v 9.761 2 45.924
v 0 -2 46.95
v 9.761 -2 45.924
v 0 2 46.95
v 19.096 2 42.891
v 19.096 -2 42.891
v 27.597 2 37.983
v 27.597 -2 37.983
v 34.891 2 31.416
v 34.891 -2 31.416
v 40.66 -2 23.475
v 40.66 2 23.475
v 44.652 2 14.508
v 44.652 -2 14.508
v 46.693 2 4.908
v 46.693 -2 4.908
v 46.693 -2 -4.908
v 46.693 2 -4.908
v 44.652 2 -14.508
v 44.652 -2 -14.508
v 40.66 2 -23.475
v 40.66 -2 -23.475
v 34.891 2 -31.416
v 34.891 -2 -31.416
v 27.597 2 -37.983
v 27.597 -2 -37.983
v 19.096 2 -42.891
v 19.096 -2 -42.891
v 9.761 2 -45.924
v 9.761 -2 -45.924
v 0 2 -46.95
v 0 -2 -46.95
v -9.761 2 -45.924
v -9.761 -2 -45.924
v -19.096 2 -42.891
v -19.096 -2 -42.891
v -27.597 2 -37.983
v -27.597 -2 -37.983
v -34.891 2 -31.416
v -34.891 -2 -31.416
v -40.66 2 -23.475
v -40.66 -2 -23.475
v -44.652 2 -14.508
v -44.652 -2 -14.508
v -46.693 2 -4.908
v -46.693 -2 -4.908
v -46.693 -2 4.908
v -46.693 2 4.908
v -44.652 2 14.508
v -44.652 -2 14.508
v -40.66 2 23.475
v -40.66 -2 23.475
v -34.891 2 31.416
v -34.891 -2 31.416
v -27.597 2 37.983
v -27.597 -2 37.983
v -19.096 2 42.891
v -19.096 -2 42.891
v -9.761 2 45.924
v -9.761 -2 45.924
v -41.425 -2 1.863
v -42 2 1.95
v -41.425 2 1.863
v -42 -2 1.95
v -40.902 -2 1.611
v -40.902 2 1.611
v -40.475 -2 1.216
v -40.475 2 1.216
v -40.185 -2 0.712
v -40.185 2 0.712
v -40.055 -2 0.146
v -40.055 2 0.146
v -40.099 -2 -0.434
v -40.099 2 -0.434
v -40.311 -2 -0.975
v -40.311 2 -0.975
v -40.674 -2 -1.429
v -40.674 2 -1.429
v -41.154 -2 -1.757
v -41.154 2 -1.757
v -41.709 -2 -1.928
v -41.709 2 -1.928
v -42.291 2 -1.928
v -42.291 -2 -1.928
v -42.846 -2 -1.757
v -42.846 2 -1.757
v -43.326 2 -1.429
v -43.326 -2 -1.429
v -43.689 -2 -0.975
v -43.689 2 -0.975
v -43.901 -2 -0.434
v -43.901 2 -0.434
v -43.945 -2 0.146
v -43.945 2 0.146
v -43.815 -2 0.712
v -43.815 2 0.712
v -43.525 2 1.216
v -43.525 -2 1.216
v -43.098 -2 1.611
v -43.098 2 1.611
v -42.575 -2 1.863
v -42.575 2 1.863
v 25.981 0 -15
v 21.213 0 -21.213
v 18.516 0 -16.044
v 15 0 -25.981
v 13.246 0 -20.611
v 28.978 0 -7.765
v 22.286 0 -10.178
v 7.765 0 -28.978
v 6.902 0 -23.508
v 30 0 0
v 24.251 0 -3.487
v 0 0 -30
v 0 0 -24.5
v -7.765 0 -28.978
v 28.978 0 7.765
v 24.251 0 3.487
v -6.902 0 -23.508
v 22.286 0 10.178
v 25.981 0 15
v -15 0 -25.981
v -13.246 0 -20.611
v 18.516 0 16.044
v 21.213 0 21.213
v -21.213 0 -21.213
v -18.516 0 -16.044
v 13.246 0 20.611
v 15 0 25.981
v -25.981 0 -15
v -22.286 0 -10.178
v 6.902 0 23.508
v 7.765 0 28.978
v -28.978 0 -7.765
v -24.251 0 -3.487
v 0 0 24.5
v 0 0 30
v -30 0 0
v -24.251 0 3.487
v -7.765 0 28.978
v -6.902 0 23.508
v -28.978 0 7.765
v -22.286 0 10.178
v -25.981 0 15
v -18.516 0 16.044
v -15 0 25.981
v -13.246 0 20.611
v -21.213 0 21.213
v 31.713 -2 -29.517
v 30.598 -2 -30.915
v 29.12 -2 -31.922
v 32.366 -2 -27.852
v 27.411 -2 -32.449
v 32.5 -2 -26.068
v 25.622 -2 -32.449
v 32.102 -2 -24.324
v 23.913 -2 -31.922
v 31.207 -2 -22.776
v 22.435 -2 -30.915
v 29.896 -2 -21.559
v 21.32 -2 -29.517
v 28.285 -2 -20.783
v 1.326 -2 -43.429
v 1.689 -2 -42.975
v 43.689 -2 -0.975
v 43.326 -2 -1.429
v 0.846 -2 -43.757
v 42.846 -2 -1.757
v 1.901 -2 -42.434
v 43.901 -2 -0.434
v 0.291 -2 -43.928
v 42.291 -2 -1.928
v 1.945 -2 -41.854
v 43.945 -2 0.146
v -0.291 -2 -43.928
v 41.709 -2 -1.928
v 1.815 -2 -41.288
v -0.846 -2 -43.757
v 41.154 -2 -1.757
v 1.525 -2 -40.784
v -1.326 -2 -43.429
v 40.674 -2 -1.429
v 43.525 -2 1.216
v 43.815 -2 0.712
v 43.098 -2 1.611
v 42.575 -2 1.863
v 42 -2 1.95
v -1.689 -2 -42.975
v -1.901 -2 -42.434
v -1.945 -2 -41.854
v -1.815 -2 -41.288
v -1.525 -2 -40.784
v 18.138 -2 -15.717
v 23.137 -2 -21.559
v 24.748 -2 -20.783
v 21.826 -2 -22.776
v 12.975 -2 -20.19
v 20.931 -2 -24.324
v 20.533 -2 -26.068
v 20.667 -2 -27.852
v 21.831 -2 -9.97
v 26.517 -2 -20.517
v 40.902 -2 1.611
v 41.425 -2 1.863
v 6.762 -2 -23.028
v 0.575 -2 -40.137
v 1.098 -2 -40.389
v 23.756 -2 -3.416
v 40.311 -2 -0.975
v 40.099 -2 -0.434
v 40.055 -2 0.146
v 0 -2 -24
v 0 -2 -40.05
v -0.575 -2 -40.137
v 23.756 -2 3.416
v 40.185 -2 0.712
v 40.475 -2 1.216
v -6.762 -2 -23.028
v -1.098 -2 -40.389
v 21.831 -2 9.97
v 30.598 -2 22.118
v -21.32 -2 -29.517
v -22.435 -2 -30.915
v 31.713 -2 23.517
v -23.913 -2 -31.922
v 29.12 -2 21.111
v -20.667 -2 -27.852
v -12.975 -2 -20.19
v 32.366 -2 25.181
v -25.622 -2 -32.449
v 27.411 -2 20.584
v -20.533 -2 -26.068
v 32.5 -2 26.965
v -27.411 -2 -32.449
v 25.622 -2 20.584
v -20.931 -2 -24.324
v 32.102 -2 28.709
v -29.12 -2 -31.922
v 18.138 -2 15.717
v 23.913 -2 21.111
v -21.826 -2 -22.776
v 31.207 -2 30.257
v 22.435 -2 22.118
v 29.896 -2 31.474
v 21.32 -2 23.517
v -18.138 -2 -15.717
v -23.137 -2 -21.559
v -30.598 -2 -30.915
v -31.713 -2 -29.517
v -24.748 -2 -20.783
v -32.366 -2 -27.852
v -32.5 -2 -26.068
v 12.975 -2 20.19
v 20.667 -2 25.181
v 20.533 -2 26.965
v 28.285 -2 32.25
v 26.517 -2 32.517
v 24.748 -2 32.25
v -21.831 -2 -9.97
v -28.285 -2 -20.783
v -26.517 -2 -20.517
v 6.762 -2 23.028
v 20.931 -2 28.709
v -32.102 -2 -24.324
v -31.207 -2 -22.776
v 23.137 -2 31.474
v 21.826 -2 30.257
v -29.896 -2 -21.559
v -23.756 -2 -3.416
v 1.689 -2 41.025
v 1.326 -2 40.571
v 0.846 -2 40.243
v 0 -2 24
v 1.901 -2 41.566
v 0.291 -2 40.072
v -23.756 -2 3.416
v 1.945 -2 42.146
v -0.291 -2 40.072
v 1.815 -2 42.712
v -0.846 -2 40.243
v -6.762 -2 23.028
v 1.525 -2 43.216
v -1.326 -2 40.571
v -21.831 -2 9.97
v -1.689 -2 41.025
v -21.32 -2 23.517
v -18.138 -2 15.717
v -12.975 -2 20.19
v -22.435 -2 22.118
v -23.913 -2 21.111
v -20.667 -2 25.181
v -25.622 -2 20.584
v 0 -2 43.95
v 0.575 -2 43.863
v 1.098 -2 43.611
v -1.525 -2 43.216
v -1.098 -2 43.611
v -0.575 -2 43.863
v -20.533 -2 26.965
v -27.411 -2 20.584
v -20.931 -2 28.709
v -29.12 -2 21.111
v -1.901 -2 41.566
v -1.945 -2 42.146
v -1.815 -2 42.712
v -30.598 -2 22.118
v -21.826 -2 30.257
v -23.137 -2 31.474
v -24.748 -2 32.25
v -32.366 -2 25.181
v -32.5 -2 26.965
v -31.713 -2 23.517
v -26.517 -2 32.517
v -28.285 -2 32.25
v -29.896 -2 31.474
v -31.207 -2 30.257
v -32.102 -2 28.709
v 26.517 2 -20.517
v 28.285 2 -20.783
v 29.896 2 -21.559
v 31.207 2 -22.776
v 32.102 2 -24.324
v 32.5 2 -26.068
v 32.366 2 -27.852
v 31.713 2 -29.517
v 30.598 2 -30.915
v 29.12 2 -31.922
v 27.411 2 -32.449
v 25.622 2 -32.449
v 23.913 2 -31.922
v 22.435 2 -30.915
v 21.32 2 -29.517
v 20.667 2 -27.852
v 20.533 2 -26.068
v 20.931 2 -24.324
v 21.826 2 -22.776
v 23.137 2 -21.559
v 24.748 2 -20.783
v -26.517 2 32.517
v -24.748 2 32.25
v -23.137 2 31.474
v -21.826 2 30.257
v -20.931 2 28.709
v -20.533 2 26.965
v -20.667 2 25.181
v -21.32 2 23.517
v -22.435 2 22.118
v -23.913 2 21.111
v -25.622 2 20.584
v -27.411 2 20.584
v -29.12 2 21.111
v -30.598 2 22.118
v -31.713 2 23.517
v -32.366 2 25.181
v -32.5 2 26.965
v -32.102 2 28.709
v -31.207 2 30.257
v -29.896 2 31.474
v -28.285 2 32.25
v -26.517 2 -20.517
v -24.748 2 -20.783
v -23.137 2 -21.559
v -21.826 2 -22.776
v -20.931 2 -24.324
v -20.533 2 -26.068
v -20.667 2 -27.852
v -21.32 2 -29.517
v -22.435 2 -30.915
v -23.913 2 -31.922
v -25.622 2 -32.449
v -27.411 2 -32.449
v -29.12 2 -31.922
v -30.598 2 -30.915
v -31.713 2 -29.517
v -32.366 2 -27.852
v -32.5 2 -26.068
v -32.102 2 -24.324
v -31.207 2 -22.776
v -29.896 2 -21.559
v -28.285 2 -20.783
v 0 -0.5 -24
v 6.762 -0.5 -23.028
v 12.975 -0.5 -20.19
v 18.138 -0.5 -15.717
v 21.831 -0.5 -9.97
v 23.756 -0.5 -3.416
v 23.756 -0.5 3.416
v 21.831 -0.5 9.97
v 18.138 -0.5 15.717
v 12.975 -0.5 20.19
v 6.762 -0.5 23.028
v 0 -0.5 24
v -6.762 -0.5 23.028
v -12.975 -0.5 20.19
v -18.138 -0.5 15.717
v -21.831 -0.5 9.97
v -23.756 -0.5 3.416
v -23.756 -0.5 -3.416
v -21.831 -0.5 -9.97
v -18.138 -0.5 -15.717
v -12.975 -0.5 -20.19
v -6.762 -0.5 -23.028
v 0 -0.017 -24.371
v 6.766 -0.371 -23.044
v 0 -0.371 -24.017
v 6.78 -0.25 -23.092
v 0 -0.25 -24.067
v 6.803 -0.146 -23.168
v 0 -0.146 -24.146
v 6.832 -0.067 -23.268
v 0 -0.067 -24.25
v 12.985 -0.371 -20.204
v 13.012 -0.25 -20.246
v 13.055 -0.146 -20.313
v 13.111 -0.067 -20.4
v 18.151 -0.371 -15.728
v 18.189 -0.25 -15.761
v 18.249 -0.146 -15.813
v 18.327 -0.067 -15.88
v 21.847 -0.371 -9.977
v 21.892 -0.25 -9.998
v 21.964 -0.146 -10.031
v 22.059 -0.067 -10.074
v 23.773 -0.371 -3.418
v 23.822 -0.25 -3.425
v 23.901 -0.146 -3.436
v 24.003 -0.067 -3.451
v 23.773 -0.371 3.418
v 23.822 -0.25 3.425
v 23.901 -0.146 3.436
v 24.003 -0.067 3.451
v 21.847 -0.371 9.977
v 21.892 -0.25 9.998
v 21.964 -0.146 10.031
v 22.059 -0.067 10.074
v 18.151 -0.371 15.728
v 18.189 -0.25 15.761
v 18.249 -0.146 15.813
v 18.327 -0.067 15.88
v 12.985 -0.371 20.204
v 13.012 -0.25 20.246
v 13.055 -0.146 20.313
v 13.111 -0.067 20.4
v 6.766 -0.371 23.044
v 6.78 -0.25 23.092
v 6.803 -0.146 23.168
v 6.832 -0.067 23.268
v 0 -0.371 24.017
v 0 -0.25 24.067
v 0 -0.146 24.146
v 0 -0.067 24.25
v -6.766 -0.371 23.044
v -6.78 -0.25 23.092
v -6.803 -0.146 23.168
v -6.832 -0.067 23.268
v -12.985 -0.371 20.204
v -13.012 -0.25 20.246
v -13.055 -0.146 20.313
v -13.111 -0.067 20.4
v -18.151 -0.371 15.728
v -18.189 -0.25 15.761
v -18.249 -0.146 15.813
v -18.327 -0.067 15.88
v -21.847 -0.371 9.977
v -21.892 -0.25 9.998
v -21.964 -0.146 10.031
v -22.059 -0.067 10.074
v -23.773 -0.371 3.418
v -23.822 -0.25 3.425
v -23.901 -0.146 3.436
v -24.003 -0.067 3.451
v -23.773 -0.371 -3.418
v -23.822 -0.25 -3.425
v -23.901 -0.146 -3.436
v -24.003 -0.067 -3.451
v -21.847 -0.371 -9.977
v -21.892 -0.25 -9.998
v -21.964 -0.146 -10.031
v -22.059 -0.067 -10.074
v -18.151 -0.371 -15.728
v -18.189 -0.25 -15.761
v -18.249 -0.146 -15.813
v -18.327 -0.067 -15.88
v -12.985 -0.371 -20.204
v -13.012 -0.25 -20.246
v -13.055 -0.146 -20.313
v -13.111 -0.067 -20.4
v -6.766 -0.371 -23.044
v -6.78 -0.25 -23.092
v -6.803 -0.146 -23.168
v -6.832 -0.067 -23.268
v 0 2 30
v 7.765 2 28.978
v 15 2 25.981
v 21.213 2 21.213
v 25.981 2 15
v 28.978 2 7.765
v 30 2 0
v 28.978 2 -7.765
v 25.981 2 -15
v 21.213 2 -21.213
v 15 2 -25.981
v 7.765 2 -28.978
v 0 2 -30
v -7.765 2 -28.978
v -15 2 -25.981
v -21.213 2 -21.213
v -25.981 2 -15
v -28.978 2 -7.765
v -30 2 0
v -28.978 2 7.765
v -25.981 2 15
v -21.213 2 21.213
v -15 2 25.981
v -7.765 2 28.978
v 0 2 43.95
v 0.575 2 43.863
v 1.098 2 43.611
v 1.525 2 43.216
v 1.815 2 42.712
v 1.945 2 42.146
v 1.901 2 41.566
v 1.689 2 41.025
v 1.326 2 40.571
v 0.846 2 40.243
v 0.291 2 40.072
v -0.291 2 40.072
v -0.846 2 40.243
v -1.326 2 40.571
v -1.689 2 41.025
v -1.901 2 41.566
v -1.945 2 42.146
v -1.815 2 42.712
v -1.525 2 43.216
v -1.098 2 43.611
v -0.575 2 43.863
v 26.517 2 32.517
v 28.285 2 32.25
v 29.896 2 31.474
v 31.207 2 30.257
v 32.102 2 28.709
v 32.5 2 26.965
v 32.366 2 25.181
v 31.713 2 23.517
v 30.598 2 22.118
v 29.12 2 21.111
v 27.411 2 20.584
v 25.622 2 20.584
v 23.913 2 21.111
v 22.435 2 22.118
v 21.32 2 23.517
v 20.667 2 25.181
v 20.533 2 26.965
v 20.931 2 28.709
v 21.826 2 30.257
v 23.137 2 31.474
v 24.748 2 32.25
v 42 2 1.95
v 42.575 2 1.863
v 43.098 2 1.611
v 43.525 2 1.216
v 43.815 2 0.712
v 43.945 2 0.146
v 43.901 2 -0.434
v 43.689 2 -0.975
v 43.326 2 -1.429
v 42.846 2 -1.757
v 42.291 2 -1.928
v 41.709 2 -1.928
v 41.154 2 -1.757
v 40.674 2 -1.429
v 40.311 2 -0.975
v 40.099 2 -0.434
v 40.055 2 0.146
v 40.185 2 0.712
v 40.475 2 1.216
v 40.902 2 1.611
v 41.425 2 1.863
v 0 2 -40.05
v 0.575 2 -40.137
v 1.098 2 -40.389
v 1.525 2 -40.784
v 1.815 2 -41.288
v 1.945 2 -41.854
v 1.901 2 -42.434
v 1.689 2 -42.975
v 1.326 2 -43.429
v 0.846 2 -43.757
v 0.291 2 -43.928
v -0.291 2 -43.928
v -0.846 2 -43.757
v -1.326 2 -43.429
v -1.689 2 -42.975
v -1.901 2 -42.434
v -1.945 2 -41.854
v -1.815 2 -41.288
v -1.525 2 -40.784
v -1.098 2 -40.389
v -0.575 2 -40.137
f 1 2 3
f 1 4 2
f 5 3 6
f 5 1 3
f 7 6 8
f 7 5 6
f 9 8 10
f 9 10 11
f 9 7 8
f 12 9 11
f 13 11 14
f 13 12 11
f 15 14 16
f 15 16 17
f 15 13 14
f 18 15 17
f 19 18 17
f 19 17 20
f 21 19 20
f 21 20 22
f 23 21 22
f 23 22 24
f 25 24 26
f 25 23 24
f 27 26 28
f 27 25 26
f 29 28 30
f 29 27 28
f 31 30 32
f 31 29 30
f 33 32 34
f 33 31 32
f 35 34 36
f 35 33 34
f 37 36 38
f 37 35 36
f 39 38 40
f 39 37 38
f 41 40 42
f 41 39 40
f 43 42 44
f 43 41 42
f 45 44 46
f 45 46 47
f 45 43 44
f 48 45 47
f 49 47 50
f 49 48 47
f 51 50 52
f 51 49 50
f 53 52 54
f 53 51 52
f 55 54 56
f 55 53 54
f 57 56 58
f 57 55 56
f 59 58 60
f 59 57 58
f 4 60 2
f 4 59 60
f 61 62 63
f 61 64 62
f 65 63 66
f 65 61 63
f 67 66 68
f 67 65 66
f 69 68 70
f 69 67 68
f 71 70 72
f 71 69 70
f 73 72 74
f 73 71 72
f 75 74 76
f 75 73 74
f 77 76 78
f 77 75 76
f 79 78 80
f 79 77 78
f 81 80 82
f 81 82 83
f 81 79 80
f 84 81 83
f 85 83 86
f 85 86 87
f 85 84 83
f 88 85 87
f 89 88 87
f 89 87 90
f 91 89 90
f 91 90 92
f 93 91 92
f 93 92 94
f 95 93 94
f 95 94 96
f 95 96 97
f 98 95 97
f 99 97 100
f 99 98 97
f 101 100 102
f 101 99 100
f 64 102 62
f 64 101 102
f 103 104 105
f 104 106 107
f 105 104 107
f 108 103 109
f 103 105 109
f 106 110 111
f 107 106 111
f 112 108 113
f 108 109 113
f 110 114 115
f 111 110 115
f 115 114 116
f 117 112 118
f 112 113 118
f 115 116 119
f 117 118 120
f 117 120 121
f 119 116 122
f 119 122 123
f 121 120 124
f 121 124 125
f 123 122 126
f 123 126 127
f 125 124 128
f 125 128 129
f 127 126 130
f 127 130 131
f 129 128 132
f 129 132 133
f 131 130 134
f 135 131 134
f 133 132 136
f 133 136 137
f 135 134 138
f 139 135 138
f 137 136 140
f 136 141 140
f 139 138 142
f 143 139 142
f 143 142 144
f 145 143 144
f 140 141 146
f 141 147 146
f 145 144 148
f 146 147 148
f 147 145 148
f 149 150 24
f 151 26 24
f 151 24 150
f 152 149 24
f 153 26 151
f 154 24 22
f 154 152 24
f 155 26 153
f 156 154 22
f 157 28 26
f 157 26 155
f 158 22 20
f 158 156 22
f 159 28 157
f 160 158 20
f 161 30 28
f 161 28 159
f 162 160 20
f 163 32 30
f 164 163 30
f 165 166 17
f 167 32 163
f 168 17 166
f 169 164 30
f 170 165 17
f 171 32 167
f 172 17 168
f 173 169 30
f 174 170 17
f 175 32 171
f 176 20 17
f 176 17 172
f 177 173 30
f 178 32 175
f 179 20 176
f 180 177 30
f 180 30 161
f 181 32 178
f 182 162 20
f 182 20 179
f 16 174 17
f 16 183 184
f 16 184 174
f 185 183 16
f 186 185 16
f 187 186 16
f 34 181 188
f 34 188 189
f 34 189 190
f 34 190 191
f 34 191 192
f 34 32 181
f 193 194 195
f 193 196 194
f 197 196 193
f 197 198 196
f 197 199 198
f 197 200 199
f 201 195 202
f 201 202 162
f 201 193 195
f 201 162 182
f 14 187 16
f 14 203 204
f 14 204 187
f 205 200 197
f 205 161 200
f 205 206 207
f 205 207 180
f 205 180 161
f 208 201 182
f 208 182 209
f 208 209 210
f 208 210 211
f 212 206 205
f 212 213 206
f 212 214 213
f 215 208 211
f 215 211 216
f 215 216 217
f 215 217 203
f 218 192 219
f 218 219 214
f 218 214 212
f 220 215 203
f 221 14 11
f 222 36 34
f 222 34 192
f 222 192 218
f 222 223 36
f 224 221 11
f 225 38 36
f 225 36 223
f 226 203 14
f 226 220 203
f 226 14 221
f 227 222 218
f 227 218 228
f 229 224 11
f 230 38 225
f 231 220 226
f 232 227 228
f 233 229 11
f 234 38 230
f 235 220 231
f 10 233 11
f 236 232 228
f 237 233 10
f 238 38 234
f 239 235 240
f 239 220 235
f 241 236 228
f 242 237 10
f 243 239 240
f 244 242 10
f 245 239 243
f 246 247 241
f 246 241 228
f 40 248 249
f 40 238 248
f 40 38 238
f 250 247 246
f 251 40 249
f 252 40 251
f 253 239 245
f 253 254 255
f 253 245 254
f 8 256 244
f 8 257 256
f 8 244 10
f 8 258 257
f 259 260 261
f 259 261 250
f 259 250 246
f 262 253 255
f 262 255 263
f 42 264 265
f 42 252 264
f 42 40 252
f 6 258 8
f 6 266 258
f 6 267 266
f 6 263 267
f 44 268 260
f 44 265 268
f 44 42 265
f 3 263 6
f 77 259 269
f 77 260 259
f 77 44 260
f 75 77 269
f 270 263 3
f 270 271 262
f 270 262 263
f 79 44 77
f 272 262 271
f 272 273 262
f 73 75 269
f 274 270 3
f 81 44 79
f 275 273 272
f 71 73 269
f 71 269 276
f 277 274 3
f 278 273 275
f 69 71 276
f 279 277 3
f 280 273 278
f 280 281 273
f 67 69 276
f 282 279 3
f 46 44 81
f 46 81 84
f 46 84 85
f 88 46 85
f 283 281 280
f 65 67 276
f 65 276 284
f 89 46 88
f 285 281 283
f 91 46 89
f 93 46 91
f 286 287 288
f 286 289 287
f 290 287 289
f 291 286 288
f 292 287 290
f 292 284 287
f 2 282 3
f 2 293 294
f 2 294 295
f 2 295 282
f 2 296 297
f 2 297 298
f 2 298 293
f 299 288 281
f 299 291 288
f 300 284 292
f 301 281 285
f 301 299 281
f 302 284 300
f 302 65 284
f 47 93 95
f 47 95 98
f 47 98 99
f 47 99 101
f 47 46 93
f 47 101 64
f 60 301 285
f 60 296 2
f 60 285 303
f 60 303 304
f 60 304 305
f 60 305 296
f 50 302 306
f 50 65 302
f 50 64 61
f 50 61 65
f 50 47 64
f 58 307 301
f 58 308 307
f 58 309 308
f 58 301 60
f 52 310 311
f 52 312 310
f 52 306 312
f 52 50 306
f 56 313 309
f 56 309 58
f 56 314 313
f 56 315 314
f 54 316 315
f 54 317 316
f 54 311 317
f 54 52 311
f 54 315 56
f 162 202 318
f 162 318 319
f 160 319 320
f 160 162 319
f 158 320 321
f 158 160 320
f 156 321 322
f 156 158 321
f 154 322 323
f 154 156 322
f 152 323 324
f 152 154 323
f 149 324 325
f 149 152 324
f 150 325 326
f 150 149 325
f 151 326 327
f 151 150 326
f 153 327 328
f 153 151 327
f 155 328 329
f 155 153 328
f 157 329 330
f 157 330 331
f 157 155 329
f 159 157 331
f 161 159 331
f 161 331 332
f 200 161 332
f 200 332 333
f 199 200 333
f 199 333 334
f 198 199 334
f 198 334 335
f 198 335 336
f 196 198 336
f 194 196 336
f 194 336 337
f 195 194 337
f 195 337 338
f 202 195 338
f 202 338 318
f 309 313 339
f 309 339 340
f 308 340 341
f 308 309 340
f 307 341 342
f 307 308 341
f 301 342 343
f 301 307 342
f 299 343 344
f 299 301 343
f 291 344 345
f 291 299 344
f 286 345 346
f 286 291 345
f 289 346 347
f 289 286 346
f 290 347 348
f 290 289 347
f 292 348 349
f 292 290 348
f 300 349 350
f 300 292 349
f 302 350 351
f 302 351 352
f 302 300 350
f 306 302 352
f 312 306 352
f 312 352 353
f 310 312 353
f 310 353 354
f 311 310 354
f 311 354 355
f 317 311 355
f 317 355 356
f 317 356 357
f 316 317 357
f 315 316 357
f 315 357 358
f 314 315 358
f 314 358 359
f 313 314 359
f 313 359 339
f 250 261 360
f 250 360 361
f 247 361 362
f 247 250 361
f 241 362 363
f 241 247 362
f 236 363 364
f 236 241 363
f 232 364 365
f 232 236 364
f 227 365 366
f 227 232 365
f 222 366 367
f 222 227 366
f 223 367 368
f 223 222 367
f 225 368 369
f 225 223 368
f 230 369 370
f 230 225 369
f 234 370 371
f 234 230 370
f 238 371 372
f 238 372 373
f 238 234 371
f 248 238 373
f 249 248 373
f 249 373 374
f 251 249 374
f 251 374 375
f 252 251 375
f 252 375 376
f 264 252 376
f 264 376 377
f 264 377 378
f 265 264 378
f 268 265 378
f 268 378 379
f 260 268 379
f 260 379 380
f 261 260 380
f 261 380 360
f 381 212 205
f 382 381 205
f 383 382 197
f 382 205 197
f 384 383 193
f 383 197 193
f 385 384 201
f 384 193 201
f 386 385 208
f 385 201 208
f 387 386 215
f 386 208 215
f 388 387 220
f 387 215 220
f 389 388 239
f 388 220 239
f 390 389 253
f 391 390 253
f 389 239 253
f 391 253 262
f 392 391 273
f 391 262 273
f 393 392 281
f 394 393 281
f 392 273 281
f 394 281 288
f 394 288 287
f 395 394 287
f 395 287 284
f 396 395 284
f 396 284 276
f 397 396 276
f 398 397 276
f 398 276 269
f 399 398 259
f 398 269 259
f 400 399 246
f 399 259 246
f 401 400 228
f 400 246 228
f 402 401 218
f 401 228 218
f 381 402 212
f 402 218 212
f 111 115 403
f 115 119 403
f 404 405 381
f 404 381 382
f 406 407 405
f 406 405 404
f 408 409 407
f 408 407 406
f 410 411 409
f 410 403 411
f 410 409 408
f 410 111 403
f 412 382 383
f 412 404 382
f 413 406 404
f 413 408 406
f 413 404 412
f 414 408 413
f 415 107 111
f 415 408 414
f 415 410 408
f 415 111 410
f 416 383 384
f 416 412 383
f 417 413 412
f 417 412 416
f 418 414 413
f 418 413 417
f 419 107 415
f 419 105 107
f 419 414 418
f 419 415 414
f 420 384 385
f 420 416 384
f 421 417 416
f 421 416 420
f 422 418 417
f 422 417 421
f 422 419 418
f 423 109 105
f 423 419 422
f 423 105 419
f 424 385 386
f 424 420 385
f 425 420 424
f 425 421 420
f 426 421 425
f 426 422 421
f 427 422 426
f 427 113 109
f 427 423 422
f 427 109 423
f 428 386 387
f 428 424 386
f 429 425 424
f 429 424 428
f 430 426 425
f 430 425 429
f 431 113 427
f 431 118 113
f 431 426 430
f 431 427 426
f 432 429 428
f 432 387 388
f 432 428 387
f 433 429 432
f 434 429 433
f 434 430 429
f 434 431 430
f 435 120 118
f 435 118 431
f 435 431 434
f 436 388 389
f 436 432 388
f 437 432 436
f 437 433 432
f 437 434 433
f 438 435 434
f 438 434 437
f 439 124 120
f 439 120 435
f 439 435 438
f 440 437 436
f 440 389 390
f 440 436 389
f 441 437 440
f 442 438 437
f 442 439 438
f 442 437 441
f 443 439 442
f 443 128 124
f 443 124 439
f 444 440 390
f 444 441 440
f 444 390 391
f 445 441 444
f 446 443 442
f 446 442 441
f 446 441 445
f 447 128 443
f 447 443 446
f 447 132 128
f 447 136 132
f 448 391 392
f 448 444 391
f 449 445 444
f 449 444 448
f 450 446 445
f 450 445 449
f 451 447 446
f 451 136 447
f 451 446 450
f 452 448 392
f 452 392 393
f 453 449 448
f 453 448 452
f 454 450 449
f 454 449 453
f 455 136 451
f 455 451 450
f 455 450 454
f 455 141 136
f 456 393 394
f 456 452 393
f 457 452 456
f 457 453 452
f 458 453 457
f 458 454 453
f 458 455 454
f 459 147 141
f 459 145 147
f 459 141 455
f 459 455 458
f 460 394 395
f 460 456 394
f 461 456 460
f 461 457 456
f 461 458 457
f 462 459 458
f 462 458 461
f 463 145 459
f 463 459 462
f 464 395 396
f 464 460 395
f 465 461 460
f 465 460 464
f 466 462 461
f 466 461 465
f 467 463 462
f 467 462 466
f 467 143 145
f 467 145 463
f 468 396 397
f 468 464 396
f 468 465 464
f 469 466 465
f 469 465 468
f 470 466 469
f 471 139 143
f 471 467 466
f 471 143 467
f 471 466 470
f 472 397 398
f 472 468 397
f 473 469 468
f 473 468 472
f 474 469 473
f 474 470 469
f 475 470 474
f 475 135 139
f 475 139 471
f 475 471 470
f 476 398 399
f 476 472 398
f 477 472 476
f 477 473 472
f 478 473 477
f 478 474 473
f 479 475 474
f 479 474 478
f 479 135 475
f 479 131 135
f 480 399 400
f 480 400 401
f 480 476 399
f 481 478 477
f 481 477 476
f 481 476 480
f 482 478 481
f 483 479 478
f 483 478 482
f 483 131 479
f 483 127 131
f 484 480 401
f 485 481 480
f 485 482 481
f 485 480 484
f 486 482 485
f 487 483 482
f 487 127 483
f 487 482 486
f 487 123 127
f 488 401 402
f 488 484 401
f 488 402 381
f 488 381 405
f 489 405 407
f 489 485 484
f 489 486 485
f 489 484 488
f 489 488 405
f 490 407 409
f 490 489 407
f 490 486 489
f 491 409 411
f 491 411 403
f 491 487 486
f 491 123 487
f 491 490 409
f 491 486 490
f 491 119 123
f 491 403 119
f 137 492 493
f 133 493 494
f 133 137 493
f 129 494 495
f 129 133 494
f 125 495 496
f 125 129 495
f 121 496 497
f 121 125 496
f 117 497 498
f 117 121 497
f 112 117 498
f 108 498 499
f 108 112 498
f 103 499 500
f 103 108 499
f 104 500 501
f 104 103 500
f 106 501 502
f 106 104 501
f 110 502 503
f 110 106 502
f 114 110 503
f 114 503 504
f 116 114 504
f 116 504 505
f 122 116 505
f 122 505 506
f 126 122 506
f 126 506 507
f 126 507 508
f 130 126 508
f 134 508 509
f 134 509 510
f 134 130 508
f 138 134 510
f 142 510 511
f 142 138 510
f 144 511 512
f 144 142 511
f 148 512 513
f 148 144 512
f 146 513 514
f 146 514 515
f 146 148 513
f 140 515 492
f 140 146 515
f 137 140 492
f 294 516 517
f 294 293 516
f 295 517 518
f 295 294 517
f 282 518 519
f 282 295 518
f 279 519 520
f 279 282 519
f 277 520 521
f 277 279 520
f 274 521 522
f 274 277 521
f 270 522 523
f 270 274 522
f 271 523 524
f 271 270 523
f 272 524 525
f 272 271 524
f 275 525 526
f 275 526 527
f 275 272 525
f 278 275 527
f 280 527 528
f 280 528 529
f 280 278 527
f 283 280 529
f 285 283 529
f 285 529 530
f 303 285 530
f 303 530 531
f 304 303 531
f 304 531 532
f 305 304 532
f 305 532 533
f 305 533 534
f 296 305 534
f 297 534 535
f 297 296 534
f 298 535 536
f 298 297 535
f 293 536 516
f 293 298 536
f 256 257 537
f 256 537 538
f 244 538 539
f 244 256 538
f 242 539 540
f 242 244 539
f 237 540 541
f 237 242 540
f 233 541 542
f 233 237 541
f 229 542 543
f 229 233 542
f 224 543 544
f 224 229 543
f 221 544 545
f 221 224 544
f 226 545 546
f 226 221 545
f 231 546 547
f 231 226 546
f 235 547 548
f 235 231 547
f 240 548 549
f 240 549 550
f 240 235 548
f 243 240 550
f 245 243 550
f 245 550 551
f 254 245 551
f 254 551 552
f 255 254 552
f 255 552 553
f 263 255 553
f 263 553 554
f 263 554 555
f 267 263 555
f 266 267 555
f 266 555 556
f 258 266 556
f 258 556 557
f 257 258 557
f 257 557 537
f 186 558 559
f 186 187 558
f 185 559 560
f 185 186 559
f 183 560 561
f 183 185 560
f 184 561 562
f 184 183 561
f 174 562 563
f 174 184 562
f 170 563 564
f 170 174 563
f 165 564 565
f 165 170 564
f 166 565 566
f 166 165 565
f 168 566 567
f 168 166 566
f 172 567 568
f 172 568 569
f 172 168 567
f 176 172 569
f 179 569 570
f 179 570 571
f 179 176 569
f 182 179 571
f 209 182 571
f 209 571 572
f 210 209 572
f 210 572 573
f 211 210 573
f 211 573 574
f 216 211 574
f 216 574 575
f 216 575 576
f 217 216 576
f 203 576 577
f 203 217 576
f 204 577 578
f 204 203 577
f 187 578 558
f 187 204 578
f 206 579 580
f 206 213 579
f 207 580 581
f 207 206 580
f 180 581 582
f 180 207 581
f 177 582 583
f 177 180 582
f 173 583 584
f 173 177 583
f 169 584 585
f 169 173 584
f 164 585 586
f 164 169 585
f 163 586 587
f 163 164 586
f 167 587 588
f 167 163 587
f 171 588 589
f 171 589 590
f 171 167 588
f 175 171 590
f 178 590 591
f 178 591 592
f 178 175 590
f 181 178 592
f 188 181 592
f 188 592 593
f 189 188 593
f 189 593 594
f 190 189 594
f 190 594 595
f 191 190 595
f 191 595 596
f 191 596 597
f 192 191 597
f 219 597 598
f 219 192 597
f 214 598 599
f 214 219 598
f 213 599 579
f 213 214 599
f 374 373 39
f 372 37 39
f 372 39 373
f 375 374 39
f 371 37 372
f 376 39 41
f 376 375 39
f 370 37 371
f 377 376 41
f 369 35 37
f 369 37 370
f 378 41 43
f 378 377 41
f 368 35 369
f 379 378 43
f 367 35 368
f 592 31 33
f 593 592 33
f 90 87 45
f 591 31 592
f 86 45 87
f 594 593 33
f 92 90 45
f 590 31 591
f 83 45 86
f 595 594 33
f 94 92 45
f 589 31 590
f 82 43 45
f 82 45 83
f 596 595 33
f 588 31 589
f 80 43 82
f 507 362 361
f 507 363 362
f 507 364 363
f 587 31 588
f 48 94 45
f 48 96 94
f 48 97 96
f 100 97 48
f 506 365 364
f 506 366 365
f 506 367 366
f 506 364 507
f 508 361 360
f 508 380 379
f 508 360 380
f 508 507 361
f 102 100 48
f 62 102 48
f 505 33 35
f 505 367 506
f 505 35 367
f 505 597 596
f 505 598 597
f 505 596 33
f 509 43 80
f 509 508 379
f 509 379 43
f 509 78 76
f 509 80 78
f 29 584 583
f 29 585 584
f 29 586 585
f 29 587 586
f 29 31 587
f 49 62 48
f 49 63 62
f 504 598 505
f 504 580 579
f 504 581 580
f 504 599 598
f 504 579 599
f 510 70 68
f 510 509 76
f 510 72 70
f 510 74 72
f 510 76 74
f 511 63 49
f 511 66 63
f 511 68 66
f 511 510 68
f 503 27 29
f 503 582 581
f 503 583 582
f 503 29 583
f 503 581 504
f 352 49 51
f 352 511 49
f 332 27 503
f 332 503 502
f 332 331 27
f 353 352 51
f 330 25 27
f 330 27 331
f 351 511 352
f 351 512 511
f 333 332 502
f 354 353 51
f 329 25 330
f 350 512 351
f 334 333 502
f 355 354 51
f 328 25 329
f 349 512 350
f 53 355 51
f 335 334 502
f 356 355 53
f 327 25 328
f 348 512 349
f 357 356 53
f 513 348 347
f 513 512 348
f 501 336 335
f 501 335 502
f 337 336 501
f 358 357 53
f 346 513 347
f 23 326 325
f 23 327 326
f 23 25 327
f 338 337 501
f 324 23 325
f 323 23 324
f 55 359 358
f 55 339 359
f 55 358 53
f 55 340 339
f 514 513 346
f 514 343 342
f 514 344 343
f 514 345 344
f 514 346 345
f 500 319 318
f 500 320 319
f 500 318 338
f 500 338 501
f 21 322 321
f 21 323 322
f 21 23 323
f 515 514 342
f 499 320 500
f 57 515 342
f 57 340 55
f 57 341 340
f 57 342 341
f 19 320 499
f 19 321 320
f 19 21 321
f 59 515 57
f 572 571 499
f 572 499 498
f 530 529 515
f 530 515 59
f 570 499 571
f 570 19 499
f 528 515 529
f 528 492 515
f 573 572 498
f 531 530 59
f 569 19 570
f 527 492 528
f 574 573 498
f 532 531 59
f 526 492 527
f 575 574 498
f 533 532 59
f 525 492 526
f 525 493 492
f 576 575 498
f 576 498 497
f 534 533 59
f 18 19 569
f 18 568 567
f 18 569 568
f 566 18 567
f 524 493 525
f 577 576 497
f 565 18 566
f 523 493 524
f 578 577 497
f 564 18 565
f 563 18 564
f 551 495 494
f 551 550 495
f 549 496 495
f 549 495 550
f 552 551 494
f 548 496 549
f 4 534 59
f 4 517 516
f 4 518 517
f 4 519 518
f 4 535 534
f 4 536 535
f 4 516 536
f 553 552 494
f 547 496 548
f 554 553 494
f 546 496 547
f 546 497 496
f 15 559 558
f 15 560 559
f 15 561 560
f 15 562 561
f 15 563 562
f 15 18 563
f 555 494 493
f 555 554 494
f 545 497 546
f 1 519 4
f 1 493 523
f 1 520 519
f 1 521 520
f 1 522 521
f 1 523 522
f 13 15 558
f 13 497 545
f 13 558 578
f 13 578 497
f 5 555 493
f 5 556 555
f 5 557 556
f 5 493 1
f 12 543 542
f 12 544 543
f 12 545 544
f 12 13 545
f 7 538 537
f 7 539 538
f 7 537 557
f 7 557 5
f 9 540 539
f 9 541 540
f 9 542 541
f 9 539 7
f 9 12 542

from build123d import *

# Parameters (mm, degrees)
SKETCH1_R           = 46.95
SKETCH1_R_2         = 1.95
SKETCH1_R_3         = 30
BOSS_EXTRUDE1_DEPTH = 2
SKETCH2_R           = 30
SKETCH2_R_2         = 24
BOSS_EXTRUDE2_DEPTH = 2
CUT_EXTRUDE1_START  = -33
SKETCH3_R           = 1.95
SKETCH3_R_2         = 6
CUT_EXTRUDE1_DEPTH  = 33
FILLET1_R           = 0.5


with BuildPart() as part:
    # Sketch1 → Boss-Extrude1 (new, symmetric)
    with BuildSketch(Plane(origin=(0, 0, 0), x_dir=(1, 0, 0), z_dir=(0, 1, 0))):
        with Locations(Location((0, 0, 0), (0, 0, 270))):
            Circle(SKETCH1_R)
        with Locations(Location((0, 42, 0), (0, 0, 270))):
            Circle(SKETCH1_R_2, mode=Mode.SUBTRACT)
        with Locations(Location((42, 0, 0), (0, 0, 270))):
            Circle(SKETCH1_R_2, mode=Mode.SUBTRACT)
        with Locations(Location((0, -42, 0), (0, 0, 270))):
            Circle(SKETCH1_R_2, mode=Mode.SUBTRACT)
        with Locations(Location((-42, 0, 0), (0, 0, 270))):
            Circle(SKETCH1_R_2, mode=Mode.SUBTRACT)
        with Locations(Location((0, 0, 0), (0, 0, 270))):
            Circle(SKETCH1_R_3, mode=Mode.SUBTRACT)
    extrude(amount=BOSS_EXTRUDE1_DEPTH, both=True)

    # Sketch2 → Boss-Extrude2 (add)
    with BuildSketch(Plane.XZ.offset(2)):
        with Locations(Location((0, 0, 0), (0, 0, 90))):
            Circle(SKETCH2_R)
        with Locations(Location((0, 0, 0), (0, 0, 270))):
            Circle(SKETCH2_R_2, mode=Mode.SUBTRACT)
    extrude(amount=-BOSS_EXTRUDE2_DEPTH)

    # Sketch3 → Cut-Extrude1 (cut)
    with BuildSketch(Plane(origin=(0, 2, 0), x_dir=(1, 0, 0), z_dir=(0, 1, 0)).offset(CUT_EXTRUDE1_START)):
        with Locations(Location((-42, 0, 0), (0, 0, 270))):
            Circle(SKETCH3_R)
        with Locations(Location((-26.516504294, 26.516504294, 0), (0, 0, 270))):
            Circle(SKETCH3_R_2)
        with Locations(Location((26.516504294, 26.516504294, 0), (0, 0, 270))):
            Circle(SKETCH3_R_2)
        with Locations(Location((26.516504294, -26.516504294, 0), (0, 0, 270))):
            Circle(SKETCH3_R_2)
        with Locations(Location((-26.516504294, -26.516504294, 0), (0, 0, 270))):
            Circle(SKETCH3_R_2)
    extrude(amount=CUT_EXTRUDE1_DEPTH, mode=Mode.SUBTRACT)

    # Fillet1
    fillet1_edges = [part.edges().sort_by_distance(p)[0] for p in [
        (0, 0, 24),
    ]]
    fillet(fillet1_edges, radius=FILLET1_R)


solid = part.part
